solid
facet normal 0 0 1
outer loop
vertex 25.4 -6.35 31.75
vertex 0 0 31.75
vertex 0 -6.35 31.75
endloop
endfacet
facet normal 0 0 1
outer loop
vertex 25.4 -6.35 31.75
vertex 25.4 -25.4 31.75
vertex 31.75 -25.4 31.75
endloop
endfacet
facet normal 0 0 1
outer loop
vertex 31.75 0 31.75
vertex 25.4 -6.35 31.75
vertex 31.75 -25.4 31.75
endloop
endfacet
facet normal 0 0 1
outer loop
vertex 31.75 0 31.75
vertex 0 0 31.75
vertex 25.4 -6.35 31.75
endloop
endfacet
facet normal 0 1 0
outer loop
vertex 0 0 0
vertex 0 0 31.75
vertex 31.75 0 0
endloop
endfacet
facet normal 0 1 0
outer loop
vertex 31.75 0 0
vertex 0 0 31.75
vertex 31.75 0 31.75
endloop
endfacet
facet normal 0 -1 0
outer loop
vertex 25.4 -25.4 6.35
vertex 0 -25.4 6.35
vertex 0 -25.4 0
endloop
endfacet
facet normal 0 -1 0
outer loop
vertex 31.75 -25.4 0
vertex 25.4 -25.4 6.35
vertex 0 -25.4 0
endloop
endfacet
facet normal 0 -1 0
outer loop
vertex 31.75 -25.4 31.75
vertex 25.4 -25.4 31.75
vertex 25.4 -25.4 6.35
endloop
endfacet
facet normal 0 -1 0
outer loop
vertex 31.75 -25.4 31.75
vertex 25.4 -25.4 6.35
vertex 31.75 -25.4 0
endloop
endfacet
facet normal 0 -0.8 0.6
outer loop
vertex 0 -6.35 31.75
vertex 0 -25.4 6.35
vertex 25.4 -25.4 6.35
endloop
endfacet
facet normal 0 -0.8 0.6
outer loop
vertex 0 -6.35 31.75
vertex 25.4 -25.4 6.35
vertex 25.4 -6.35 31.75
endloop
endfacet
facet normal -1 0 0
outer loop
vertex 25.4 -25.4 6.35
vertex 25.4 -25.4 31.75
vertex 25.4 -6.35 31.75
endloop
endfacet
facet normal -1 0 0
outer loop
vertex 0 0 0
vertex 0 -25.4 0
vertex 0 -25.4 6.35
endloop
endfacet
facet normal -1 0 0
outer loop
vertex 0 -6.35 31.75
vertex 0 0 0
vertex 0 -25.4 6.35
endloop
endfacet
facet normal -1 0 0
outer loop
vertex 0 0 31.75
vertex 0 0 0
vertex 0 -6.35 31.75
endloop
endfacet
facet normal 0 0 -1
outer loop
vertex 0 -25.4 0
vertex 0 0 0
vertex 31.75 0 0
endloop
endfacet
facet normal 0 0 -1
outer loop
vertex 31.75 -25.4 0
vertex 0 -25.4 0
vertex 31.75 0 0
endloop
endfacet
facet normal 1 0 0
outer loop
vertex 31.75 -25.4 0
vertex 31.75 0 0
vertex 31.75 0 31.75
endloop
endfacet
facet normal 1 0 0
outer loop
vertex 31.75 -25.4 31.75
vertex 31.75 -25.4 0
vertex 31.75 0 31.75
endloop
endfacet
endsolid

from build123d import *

# Parameters (mm, degrees)
F0_W     = 31.75
F0_H     = 31.75
F1_DEPTH = 25.4
F3_DEPTH = 25.4


with BuildPart() as f1:
    # F0 (on Front) → F1 (new body)
    with BuildSketch(Plane.XZ):
        with Locations((15.875, 15.875)):
            Rectangle(F0_W, F0_H)
    extrude(amount=F1_DEPTH)

    # F2 (on Right) → F3 (cut)
    with BuildSketch(Plane.YZ):
        Polygon((-25.4, 6.35), (-6.35, 31.75), (-25.4, 31.75), align=None)
    extrude(amount=F3_DEPTH, mode=Mode.SUBTRACT)


solid = f1.part
